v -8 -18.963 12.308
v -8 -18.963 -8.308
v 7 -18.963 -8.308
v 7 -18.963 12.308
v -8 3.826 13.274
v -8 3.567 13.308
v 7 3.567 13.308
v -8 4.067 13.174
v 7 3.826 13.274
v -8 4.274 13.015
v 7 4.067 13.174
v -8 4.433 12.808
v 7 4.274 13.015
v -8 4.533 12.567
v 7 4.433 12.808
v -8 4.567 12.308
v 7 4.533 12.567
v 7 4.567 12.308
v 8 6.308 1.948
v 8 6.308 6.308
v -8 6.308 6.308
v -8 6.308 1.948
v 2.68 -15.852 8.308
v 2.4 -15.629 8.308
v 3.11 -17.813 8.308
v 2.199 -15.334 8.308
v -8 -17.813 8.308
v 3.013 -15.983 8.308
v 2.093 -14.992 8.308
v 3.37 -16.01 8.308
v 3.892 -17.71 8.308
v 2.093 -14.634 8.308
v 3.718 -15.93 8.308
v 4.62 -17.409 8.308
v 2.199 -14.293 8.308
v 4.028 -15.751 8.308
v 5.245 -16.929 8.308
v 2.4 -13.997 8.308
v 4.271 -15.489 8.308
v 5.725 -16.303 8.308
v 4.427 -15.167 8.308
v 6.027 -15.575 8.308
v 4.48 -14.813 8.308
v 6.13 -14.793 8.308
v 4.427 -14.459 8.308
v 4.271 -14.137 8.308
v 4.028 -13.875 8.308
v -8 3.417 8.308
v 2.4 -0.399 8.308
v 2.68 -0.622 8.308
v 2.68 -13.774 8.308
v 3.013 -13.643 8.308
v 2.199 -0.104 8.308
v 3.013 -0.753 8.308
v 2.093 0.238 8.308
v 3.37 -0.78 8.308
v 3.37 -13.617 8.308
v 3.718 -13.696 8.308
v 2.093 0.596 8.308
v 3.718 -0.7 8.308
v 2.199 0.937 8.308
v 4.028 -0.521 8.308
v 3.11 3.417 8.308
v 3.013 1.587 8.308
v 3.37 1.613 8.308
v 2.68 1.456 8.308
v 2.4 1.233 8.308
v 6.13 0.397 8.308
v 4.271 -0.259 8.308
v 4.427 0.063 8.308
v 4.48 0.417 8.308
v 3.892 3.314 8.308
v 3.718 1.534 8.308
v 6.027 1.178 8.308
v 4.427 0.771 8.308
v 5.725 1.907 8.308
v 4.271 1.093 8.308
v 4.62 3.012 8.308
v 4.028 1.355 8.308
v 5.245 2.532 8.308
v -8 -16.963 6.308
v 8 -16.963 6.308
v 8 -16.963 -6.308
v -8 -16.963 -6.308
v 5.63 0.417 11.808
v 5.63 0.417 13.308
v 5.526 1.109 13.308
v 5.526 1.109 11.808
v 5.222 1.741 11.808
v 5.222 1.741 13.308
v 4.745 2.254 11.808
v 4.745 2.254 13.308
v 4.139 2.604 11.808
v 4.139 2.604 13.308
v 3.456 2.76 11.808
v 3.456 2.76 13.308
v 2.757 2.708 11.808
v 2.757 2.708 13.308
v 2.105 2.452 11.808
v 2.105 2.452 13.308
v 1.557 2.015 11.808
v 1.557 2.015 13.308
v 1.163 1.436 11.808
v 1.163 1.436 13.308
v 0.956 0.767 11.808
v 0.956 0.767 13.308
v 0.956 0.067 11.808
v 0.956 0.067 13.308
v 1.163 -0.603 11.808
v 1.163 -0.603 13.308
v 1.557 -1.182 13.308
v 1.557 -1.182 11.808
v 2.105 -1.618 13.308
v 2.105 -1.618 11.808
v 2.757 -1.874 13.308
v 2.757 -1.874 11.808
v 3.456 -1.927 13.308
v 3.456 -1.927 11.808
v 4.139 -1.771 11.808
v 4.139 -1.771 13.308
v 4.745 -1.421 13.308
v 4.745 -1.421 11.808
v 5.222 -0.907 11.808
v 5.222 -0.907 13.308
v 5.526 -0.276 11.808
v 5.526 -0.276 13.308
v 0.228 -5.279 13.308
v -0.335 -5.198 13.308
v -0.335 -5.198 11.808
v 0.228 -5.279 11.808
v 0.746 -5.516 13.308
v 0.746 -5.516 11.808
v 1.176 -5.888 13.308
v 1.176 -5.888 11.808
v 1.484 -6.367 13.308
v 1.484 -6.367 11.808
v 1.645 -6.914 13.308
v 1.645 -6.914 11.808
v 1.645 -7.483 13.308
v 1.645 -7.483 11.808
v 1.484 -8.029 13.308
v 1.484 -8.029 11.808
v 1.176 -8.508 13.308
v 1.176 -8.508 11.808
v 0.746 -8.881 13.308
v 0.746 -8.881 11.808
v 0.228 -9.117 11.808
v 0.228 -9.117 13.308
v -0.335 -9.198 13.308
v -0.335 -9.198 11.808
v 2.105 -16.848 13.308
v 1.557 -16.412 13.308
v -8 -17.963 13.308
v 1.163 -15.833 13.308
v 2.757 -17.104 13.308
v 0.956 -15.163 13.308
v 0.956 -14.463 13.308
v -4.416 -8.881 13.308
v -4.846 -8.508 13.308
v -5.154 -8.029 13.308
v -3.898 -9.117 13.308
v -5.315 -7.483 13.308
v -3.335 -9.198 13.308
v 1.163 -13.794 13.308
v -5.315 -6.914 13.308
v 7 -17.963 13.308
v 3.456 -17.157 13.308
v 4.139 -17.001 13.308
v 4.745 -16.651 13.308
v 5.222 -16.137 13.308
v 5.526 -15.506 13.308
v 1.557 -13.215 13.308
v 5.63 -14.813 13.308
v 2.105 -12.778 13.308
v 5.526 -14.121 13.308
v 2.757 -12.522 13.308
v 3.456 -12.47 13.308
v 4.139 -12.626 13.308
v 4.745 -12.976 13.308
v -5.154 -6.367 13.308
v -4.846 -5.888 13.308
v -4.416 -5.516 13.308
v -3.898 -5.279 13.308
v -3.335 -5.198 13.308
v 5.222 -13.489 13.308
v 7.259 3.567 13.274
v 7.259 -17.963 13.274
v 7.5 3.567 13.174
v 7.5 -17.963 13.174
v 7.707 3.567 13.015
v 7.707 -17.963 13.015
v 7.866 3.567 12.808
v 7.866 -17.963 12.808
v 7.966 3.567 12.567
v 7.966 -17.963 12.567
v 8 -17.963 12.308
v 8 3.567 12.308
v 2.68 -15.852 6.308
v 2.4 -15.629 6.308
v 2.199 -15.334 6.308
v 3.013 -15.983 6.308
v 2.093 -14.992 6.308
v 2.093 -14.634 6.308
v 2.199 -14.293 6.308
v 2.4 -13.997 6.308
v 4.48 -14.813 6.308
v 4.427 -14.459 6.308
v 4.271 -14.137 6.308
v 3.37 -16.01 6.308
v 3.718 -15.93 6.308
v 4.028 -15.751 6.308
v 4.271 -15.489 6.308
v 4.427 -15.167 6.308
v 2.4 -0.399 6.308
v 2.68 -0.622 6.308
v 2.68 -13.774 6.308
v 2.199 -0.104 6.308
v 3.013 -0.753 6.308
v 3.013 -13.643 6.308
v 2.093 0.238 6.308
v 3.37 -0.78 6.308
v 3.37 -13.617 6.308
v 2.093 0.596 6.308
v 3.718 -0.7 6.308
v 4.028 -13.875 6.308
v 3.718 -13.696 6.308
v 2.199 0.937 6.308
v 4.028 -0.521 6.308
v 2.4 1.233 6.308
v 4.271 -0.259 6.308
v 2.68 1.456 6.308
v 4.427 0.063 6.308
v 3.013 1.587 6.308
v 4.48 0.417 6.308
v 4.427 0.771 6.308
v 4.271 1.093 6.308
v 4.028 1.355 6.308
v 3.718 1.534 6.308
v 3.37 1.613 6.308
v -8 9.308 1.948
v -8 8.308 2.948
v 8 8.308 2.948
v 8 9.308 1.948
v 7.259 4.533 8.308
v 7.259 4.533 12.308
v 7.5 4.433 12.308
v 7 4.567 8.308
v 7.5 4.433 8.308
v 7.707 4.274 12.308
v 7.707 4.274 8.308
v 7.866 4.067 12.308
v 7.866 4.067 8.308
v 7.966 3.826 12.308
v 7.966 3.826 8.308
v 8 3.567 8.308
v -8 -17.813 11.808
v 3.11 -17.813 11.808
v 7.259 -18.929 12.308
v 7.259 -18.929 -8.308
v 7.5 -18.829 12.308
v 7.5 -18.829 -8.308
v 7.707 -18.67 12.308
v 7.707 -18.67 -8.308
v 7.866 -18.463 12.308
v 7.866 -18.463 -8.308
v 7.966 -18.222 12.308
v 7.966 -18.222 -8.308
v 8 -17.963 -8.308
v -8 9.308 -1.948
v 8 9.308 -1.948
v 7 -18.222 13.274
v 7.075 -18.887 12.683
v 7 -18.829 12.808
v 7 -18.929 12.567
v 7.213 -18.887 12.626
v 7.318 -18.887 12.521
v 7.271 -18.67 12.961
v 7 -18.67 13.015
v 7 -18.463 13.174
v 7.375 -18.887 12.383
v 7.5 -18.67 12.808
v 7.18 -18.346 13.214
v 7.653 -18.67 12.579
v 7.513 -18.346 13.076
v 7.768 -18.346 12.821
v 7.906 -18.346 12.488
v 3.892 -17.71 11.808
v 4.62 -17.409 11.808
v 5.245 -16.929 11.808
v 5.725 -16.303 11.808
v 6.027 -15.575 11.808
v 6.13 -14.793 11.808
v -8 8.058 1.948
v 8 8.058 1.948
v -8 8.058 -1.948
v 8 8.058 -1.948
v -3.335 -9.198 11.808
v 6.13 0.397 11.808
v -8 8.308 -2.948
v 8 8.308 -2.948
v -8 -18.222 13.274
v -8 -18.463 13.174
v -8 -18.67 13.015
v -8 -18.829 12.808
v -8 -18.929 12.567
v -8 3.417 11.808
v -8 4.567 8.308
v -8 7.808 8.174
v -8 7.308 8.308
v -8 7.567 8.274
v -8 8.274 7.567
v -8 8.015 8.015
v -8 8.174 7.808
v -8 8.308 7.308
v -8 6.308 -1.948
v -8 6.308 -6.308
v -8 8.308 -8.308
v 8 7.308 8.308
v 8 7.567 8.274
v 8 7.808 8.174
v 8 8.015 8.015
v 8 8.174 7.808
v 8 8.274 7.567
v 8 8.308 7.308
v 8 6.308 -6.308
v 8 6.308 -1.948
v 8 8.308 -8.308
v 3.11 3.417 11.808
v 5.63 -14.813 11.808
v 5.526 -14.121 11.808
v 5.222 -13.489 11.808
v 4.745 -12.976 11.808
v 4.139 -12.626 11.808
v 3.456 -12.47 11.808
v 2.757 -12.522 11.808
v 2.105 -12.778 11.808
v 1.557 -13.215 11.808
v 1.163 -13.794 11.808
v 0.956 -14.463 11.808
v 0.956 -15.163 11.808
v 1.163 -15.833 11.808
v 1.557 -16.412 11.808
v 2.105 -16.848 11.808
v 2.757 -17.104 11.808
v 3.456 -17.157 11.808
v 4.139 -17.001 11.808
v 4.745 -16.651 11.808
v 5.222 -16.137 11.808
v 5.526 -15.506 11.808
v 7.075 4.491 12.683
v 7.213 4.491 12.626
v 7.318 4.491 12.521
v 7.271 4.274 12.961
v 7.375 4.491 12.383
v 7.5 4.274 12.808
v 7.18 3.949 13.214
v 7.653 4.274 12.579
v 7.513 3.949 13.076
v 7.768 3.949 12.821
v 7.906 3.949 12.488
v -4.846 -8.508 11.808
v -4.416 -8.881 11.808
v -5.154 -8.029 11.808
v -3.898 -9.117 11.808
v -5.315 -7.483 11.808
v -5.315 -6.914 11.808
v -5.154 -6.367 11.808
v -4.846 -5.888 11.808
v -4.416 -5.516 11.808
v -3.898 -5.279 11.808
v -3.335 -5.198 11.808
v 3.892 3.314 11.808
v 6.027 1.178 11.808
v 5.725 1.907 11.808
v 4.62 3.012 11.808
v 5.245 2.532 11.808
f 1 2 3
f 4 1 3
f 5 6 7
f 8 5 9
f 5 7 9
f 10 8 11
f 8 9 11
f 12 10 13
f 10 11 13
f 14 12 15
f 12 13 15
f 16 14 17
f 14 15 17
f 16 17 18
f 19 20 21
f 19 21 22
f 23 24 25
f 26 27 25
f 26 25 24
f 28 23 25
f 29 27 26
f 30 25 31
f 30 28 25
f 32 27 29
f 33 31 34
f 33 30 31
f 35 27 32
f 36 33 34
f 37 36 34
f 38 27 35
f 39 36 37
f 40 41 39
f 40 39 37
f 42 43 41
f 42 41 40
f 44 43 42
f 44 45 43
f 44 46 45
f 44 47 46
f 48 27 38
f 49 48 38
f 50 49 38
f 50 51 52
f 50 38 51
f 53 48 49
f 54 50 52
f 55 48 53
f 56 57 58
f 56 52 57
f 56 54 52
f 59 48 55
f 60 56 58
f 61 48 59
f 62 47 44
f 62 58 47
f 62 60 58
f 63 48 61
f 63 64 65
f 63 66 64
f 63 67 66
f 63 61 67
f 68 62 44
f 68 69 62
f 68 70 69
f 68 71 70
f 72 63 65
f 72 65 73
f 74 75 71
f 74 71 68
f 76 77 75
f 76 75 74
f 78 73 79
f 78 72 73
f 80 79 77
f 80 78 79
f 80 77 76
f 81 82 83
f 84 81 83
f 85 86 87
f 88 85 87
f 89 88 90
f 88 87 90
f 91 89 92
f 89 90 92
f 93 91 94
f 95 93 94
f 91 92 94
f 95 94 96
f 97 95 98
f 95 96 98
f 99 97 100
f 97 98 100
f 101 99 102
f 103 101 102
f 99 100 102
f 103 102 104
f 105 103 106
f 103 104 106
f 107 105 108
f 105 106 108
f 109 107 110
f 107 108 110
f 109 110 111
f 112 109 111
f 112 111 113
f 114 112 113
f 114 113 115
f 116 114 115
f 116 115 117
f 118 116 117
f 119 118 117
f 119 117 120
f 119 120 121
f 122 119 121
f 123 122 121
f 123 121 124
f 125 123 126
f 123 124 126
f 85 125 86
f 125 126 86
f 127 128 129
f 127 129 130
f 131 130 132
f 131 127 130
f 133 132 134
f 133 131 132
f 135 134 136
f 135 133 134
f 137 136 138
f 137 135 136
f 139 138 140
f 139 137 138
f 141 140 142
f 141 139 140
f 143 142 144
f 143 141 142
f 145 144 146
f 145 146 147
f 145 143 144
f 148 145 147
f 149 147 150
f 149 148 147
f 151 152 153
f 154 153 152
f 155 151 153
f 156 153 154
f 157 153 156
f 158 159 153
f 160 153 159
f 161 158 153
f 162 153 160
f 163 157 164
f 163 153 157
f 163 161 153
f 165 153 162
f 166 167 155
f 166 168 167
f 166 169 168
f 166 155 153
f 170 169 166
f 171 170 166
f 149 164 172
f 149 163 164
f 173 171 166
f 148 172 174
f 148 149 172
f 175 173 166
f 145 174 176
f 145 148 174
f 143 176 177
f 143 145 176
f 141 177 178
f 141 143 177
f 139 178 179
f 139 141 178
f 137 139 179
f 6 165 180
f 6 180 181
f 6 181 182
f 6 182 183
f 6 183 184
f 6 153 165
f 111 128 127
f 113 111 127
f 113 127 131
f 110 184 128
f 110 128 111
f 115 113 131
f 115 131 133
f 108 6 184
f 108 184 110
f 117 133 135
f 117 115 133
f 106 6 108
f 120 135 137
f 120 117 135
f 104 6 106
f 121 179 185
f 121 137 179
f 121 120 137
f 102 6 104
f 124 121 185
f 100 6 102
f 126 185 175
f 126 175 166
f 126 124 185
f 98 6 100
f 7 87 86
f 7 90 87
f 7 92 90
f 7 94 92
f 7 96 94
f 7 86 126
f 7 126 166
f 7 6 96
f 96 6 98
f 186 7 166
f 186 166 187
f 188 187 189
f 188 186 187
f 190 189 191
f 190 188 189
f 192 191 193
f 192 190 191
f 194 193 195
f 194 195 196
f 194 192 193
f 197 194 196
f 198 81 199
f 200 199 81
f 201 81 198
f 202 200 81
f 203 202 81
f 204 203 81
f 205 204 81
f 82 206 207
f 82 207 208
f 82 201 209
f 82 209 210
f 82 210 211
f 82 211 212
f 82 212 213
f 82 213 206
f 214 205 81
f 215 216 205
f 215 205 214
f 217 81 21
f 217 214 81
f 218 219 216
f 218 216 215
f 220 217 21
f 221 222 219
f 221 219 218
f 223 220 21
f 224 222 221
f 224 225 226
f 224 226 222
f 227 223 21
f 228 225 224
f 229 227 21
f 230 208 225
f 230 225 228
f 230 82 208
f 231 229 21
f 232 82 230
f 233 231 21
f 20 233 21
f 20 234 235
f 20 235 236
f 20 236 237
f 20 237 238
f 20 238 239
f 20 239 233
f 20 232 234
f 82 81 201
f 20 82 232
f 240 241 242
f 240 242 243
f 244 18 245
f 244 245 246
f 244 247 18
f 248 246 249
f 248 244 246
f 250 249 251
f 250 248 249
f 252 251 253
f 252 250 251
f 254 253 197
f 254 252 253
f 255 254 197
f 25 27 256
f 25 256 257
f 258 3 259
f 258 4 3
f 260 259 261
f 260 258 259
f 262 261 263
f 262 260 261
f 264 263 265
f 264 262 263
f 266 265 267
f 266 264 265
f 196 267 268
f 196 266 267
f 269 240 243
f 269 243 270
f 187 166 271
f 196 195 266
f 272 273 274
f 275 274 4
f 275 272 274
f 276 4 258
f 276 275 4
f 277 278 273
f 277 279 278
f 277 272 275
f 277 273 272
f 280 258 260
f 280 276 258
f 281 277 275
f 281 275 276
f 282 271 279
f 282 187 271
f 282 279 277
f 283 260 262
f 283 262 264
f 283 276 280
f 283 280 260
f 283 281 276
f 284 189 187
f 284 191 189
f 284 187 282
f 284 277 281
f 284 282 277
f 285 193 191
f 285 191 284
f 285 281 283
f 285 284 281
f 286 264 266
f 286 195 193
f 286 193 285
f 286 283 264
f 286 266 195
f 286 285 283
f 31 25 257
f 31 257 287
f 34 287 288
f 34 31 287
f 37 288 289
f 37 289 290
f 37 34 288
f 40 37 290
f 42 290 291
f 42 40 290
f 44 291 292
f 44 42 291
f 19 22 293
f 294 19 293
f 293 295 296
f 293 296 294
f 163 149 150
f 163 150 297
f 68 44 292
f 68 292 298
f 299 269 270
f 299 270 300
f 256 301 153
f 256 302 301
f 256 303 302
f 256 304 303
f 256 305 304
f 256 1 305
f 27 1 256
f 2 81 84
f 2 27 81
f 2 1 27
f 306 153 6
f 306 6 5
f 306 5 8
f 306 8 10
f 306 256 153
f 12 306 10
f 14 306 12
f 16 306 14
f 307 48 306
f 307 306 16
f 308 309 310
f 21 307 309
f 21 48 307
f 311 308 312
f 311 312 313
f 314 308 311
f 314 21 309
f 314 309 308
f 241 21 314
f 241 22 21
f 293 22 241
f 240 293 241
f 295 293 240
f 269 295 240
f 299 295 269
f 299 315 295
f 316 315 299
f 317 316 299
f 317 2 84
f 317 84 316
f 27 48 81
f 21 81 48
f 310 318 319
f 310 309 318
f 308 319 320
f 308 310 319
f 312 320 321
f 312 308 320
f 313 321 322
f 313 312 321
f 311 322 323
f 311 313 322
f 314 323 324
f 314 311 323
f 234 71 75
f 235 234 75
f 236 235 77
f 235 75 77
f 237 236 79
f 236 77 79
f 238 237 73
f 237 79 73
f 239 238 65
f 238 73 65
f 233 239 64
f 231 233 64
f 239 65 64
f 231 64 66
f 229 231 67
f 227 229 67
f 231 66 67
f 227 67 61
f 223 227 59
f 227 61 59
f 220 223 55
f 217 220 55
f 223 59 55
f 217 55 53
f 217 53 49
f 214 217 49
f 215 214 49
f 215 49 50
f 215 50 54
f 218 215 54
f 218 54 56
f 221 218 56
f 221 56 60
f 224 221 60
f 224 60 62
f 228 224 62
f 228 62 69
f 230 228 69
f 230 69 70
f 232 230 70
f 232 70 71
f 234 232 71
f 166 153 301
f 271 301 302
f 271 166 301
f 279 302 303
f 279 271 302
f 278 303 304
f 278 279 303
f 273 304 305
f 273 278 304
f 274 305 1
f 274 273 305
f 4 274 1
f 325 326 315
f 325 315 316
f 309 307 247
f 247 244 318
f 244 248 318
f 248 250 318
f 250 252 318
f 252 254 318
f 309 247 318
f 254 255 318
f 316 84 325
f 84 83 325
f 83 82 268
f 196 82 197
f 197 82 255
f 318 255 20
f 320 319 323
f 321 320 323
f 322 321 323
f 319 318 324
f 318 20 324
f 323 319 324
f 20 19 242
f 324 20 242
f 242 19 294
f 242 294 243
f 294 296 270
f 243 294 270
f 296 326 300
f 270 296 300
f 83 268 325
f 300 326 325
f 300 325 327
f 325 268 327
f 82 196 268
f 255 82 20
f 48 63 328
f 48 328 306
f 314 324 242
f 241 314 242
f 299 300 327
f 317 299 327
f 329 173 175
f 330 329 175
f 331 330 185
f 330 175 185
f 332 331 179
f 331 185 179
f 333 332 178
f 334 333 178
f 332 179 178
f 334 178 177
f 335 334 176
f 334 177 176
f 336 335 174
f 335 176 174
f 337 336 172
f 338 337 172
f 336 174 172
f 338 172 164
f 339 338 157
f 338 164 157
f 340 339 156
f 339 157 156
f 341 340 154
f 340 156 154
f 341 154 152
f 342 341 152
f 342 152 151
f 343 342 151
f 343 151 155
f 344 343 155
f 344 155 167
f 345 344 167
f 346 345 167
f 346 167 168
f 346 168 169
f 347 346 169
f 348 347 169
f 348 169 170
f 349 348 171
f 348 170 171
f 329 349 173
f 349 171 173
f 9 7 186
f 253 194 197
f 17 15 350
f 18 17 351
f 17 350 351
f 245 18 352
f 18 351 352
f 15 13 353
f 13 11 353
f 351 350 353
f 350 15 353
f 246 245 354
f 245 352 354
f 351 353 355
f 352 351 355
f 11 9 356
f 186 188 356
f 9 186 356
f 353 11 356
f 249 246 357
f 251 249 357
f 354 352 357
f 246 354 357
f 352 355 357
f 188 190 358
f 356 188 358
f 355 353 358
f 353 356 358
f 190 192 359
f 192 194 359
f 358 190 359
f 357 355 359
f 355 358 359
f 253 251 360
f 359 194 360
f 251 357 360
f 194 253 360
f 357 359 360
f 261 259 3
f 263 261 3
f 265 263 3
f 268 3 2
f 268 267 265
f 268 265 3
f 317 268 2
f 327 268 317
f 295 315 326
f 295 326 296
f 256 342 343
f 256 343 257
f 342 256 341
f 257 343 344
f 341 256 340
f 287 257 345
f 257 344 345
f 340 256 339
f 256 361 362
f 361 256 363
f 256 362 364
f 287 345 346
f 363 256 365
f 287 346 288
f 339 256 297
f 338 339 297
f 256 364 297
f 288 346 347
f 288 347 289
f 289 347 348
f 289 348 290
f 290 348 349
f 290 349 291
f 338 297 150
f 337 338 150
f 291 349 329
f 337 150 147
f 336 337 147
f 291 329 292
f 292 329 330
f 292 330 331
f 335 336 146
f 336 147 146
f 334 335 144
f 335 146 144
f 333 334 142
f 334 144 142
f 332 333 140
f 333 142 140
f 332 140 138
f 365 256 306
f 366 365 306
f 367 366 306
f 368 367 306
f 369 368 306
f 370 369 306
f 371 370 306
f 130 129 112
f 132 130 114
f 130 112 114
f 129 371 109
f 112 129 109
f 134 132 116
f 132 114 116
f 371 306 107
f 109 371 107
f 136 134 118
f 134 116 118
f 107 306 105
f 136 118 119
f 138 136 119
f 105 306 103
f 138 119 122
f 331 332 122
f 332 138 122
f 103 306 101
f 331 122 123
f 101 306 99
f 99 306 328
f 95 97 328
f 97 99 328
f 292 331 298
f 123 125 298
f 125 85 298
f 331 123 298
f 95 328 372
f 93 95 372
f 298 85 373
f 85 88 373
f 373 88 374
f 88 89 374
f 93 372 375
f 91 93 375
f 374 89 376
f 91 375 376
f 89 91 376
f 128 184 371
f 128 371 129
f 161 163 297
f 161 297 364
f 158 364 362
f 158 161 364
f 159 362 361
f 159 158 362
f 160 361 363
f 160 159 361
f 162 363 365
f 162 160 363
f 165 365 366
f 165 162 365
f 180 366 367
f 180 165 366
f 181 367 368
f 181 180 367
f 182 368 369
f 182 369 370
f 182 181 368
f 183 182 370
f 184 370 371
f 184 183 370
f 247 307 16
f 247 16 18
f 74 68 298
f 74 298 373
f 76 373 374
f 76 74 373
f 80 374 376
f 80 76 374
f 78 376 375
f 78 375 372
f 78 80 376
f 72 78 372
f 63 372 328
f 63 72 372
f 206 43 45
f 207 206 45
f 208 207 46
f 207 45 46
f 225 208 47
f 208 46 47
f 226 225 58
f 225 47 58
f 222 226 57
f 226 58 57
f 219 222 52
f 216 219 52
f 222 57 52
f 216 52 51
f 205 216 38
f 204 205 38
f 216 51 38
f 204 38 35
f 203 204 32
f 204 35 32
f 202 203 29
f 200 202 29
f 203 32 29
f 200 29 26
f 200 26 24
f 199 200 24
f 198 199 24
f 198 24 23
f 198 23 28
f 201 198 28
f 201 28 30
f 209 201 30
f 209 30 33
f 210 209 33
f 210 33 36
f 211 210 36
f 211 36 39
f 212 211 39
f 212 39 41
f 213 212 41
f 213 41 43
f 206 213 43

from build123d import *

# Parameters (mm, degrees)
SKETCH1_W                 = 16.6158
SKETCH1_H                 = 27.2711
SKETCH1_W_2               = 12.6158
SKETCH1_H_2               = 23.2711
BOSS_EXTRUDE1_DEPTH       = 8
SKETCH2_W                 = 3.8956
SKETCH2_H                 = 2.5
CUT_EXTRUDE2_DEPTH        = 27.165323553
SKETCH5_W                 = 16
SKETCH5_H                 = 23.53
BOSS_EXTRUDE2_DEPTH       = 0.0001
M2_CLEARANCE_HOLE1_REACH  = 28.452
M2_CLEARANCE_HOLE1_BORE_R = 1.2
BOSS_EXTRUDE3_DEPTH       = 3.5
SKETCH9_W                 = 16
SKETCH9_H                 = 23.53
BOSS_EXTRUDE4_DEPTH       = 1.5
SKETCH10_R                = 2.35
CUT_EXTRUDE3_DEPTH        = 1.5
FILLET1_R                 = 1
BOSS_EXTRUDE5_DEPTH       = 16


with BuildPart() as part:
    # Sketch1 → Boss-Extrude1 (new, symmetric)
    with BuildSketch(Plane(origin=(0, 0, 0), x_dir=(0, 0, -1), z_dir=(1, 0, 0))):
        with Locations((0, -5.32765)):
            Rectangle(SKETCH1_W, SKETCH1_H)
        with Locations((0, -5.32765)):
            Rectangle(SKETCH1_W_2, SKETCH1_H_2, mode=Mode.SUBTRACT)
    extrude(amount=BOSS_EXTRUDE1_DEPTH, both=True)

    # Sketch2 → Cut-Extrude2 (cut, through all)
    with BuildSketch(Plane.ZY.offset(8)):
        with Locations((0, 6.8079)):
            Rectangle(SKETCH2_W, SKETCH2_H)
    extrude(amount=-CUT_EXTRUDE2_DEPTH, mode=Mode.SUBTRACT)

    # Sketch5 → Boss-Extrude2 (add)
    with BuildSketch(Plane.XY.offset(8.3079)):
        with Locations((0, -7.1982)):
            Rectangle(SKETCH5_W, SKETCH5_H)
    extrude(amount=BOSS_EXTRUDE2_DEPTH)

    # M2 Clearance Hole1 bore → M2 Clearance Hole1 (cut, up to next)
    with BuildSketch(Plane.XY.offset(8.308), mode=Mode.PRIVATE) as m2_clearance_hole1_sk1:
        with Locations((3.28, 0.4168)):
            Circle(M2_CLEARANCE_HOLE1_BORE_R)
    m2_clearance_hole1_tool1 = extrude(m2_clearance_hole1_sk1.sketch, amount=-M2_CLEARANCE_HOLE1_REACH, mode=Mode.PRIVATE) & part.part
    # M2 Clearance Hole1 bore → M2 Clearance Hole1 (cut, up to next)
    with BuildSketch(Plane.XY.offset(8.308), mode=Mode.PRIVATE) as m2_clearance_hole1_sk2:
        with Locations((3.28, -14.8132)):
            Circle(M2_CLEARANCE_HOLE1_BORE_R)
    m2_clearance_hole1_tool2 = extrude(m2_clearance_hole1_sk2.sketch, amount=-M2_CLEARANCE_HOLE1_REACH, mode=Mode.PRIVATE) & part.part
    add(m2_clearance_hole1_tool1.solids().sort_by_distance((3.28, 0.4168, 8.308))[0], mode=Mode.SUBTRACT)
    add(m2_clearance_hole1_tool2.solids().sort_by_distance((3.28, -14.8132, 8.308))[0], mode=Mode.SUBTRACT)

    # Sketch8 → Boss-Extrude3 (add)
    with BuildSketch(Plane.XY.offset(8.308)):
        with BuildLine():
            Line((-8, -17.8132), (3.11, -17.8132))
            ThreePointArc((3.11, -17.8132), (5.245462479, -16.928662479), (6.13, -14.7932))
            Line((6.13, -14.7932), (6.13, 0.3968))
            ThreePointArc((6.13, 0.3968), (5.245462479, 2.532262479), (3.11, 3.4168))
            Line((3.11, 3.4168), (-8, 3.4168))
            Line((-8, 3.4168), (-8, 4.5668))
            Line((-8, 4.5668), (8, 4.5668))
            Line((8, 4.5668), (8, -18.9632))
            Line((8, -18.9632), (-8, -18.9632))
            Line((-8, -18.9632), (-8, -17.8132))
        make_face()
    extrude(amount=BOSS_EXTRUDE3_DEPTH)

    # Sketch9 → Boss-Extrude4 (add)
    with BuildSketch(Plane.XY.offset(11.808)):
        with Locations((0, -7.1982)):
            Rectangle(SKETCH9_W, SKETCH9_H)
    extrude(amount=BOSS_EXTRUDE4_DEPTH)

    # Sketch10 → Cut-Extrude3 (cut)
    with BuildSketch(Plane.XY.offset(13.308)):
        with Locations((3.28, 0.4168)):
            Circle(SKETCH10_R)
        with Locations((3.28, -14.8132)):
            Circle(SKETCH10_R)
        with BuildLine():
            Line((-3.335, -5.1982), (-0.335, -5.1982))
            ThreePointArc((-0.335, -5.1982), (1.665, -7.1982), (-0.335, -9.1982))
            Line((-0.335, -9.1982), (-3.335, -9.1982))
            ThreePointArc((-3.335, -9.1982), (-5.335, -7.1982), (-3.335, -5.1982))
        make_face()
    extrude(amount=-CUT_EXTRUDE3_DEPTH, mode=Mode.SUBTRACT)

    # Fillet1
    fillet1_edges = [part.edges().sort_by_distance(p)[0] for p in [
        (8, -7.1982, 13.308),
        (0, 4.5668, 13.308),
        (0, -18.9632, 13.308),
        (8, -18.9632, 2.50005),
        (0, 8.3079, 8.3079),
        (8, 4.5668, 10.80795),
    ]]
    fillet(fillet1_edges, radius=FILLET1_R)

    # Sketch11 → Boss-Extrude5 (add)
    with BuildSketch(Plane.ZY.offset(8)):
        Polygon((2.9478, 8.3079), (1.9478, 9.3079), (-1.9478, 9.3079), (-2.9478, 8.3079), align=None)
    extrude(amount=-BOSS_EXTRUDE5_DEPTH)


solid = part.part
